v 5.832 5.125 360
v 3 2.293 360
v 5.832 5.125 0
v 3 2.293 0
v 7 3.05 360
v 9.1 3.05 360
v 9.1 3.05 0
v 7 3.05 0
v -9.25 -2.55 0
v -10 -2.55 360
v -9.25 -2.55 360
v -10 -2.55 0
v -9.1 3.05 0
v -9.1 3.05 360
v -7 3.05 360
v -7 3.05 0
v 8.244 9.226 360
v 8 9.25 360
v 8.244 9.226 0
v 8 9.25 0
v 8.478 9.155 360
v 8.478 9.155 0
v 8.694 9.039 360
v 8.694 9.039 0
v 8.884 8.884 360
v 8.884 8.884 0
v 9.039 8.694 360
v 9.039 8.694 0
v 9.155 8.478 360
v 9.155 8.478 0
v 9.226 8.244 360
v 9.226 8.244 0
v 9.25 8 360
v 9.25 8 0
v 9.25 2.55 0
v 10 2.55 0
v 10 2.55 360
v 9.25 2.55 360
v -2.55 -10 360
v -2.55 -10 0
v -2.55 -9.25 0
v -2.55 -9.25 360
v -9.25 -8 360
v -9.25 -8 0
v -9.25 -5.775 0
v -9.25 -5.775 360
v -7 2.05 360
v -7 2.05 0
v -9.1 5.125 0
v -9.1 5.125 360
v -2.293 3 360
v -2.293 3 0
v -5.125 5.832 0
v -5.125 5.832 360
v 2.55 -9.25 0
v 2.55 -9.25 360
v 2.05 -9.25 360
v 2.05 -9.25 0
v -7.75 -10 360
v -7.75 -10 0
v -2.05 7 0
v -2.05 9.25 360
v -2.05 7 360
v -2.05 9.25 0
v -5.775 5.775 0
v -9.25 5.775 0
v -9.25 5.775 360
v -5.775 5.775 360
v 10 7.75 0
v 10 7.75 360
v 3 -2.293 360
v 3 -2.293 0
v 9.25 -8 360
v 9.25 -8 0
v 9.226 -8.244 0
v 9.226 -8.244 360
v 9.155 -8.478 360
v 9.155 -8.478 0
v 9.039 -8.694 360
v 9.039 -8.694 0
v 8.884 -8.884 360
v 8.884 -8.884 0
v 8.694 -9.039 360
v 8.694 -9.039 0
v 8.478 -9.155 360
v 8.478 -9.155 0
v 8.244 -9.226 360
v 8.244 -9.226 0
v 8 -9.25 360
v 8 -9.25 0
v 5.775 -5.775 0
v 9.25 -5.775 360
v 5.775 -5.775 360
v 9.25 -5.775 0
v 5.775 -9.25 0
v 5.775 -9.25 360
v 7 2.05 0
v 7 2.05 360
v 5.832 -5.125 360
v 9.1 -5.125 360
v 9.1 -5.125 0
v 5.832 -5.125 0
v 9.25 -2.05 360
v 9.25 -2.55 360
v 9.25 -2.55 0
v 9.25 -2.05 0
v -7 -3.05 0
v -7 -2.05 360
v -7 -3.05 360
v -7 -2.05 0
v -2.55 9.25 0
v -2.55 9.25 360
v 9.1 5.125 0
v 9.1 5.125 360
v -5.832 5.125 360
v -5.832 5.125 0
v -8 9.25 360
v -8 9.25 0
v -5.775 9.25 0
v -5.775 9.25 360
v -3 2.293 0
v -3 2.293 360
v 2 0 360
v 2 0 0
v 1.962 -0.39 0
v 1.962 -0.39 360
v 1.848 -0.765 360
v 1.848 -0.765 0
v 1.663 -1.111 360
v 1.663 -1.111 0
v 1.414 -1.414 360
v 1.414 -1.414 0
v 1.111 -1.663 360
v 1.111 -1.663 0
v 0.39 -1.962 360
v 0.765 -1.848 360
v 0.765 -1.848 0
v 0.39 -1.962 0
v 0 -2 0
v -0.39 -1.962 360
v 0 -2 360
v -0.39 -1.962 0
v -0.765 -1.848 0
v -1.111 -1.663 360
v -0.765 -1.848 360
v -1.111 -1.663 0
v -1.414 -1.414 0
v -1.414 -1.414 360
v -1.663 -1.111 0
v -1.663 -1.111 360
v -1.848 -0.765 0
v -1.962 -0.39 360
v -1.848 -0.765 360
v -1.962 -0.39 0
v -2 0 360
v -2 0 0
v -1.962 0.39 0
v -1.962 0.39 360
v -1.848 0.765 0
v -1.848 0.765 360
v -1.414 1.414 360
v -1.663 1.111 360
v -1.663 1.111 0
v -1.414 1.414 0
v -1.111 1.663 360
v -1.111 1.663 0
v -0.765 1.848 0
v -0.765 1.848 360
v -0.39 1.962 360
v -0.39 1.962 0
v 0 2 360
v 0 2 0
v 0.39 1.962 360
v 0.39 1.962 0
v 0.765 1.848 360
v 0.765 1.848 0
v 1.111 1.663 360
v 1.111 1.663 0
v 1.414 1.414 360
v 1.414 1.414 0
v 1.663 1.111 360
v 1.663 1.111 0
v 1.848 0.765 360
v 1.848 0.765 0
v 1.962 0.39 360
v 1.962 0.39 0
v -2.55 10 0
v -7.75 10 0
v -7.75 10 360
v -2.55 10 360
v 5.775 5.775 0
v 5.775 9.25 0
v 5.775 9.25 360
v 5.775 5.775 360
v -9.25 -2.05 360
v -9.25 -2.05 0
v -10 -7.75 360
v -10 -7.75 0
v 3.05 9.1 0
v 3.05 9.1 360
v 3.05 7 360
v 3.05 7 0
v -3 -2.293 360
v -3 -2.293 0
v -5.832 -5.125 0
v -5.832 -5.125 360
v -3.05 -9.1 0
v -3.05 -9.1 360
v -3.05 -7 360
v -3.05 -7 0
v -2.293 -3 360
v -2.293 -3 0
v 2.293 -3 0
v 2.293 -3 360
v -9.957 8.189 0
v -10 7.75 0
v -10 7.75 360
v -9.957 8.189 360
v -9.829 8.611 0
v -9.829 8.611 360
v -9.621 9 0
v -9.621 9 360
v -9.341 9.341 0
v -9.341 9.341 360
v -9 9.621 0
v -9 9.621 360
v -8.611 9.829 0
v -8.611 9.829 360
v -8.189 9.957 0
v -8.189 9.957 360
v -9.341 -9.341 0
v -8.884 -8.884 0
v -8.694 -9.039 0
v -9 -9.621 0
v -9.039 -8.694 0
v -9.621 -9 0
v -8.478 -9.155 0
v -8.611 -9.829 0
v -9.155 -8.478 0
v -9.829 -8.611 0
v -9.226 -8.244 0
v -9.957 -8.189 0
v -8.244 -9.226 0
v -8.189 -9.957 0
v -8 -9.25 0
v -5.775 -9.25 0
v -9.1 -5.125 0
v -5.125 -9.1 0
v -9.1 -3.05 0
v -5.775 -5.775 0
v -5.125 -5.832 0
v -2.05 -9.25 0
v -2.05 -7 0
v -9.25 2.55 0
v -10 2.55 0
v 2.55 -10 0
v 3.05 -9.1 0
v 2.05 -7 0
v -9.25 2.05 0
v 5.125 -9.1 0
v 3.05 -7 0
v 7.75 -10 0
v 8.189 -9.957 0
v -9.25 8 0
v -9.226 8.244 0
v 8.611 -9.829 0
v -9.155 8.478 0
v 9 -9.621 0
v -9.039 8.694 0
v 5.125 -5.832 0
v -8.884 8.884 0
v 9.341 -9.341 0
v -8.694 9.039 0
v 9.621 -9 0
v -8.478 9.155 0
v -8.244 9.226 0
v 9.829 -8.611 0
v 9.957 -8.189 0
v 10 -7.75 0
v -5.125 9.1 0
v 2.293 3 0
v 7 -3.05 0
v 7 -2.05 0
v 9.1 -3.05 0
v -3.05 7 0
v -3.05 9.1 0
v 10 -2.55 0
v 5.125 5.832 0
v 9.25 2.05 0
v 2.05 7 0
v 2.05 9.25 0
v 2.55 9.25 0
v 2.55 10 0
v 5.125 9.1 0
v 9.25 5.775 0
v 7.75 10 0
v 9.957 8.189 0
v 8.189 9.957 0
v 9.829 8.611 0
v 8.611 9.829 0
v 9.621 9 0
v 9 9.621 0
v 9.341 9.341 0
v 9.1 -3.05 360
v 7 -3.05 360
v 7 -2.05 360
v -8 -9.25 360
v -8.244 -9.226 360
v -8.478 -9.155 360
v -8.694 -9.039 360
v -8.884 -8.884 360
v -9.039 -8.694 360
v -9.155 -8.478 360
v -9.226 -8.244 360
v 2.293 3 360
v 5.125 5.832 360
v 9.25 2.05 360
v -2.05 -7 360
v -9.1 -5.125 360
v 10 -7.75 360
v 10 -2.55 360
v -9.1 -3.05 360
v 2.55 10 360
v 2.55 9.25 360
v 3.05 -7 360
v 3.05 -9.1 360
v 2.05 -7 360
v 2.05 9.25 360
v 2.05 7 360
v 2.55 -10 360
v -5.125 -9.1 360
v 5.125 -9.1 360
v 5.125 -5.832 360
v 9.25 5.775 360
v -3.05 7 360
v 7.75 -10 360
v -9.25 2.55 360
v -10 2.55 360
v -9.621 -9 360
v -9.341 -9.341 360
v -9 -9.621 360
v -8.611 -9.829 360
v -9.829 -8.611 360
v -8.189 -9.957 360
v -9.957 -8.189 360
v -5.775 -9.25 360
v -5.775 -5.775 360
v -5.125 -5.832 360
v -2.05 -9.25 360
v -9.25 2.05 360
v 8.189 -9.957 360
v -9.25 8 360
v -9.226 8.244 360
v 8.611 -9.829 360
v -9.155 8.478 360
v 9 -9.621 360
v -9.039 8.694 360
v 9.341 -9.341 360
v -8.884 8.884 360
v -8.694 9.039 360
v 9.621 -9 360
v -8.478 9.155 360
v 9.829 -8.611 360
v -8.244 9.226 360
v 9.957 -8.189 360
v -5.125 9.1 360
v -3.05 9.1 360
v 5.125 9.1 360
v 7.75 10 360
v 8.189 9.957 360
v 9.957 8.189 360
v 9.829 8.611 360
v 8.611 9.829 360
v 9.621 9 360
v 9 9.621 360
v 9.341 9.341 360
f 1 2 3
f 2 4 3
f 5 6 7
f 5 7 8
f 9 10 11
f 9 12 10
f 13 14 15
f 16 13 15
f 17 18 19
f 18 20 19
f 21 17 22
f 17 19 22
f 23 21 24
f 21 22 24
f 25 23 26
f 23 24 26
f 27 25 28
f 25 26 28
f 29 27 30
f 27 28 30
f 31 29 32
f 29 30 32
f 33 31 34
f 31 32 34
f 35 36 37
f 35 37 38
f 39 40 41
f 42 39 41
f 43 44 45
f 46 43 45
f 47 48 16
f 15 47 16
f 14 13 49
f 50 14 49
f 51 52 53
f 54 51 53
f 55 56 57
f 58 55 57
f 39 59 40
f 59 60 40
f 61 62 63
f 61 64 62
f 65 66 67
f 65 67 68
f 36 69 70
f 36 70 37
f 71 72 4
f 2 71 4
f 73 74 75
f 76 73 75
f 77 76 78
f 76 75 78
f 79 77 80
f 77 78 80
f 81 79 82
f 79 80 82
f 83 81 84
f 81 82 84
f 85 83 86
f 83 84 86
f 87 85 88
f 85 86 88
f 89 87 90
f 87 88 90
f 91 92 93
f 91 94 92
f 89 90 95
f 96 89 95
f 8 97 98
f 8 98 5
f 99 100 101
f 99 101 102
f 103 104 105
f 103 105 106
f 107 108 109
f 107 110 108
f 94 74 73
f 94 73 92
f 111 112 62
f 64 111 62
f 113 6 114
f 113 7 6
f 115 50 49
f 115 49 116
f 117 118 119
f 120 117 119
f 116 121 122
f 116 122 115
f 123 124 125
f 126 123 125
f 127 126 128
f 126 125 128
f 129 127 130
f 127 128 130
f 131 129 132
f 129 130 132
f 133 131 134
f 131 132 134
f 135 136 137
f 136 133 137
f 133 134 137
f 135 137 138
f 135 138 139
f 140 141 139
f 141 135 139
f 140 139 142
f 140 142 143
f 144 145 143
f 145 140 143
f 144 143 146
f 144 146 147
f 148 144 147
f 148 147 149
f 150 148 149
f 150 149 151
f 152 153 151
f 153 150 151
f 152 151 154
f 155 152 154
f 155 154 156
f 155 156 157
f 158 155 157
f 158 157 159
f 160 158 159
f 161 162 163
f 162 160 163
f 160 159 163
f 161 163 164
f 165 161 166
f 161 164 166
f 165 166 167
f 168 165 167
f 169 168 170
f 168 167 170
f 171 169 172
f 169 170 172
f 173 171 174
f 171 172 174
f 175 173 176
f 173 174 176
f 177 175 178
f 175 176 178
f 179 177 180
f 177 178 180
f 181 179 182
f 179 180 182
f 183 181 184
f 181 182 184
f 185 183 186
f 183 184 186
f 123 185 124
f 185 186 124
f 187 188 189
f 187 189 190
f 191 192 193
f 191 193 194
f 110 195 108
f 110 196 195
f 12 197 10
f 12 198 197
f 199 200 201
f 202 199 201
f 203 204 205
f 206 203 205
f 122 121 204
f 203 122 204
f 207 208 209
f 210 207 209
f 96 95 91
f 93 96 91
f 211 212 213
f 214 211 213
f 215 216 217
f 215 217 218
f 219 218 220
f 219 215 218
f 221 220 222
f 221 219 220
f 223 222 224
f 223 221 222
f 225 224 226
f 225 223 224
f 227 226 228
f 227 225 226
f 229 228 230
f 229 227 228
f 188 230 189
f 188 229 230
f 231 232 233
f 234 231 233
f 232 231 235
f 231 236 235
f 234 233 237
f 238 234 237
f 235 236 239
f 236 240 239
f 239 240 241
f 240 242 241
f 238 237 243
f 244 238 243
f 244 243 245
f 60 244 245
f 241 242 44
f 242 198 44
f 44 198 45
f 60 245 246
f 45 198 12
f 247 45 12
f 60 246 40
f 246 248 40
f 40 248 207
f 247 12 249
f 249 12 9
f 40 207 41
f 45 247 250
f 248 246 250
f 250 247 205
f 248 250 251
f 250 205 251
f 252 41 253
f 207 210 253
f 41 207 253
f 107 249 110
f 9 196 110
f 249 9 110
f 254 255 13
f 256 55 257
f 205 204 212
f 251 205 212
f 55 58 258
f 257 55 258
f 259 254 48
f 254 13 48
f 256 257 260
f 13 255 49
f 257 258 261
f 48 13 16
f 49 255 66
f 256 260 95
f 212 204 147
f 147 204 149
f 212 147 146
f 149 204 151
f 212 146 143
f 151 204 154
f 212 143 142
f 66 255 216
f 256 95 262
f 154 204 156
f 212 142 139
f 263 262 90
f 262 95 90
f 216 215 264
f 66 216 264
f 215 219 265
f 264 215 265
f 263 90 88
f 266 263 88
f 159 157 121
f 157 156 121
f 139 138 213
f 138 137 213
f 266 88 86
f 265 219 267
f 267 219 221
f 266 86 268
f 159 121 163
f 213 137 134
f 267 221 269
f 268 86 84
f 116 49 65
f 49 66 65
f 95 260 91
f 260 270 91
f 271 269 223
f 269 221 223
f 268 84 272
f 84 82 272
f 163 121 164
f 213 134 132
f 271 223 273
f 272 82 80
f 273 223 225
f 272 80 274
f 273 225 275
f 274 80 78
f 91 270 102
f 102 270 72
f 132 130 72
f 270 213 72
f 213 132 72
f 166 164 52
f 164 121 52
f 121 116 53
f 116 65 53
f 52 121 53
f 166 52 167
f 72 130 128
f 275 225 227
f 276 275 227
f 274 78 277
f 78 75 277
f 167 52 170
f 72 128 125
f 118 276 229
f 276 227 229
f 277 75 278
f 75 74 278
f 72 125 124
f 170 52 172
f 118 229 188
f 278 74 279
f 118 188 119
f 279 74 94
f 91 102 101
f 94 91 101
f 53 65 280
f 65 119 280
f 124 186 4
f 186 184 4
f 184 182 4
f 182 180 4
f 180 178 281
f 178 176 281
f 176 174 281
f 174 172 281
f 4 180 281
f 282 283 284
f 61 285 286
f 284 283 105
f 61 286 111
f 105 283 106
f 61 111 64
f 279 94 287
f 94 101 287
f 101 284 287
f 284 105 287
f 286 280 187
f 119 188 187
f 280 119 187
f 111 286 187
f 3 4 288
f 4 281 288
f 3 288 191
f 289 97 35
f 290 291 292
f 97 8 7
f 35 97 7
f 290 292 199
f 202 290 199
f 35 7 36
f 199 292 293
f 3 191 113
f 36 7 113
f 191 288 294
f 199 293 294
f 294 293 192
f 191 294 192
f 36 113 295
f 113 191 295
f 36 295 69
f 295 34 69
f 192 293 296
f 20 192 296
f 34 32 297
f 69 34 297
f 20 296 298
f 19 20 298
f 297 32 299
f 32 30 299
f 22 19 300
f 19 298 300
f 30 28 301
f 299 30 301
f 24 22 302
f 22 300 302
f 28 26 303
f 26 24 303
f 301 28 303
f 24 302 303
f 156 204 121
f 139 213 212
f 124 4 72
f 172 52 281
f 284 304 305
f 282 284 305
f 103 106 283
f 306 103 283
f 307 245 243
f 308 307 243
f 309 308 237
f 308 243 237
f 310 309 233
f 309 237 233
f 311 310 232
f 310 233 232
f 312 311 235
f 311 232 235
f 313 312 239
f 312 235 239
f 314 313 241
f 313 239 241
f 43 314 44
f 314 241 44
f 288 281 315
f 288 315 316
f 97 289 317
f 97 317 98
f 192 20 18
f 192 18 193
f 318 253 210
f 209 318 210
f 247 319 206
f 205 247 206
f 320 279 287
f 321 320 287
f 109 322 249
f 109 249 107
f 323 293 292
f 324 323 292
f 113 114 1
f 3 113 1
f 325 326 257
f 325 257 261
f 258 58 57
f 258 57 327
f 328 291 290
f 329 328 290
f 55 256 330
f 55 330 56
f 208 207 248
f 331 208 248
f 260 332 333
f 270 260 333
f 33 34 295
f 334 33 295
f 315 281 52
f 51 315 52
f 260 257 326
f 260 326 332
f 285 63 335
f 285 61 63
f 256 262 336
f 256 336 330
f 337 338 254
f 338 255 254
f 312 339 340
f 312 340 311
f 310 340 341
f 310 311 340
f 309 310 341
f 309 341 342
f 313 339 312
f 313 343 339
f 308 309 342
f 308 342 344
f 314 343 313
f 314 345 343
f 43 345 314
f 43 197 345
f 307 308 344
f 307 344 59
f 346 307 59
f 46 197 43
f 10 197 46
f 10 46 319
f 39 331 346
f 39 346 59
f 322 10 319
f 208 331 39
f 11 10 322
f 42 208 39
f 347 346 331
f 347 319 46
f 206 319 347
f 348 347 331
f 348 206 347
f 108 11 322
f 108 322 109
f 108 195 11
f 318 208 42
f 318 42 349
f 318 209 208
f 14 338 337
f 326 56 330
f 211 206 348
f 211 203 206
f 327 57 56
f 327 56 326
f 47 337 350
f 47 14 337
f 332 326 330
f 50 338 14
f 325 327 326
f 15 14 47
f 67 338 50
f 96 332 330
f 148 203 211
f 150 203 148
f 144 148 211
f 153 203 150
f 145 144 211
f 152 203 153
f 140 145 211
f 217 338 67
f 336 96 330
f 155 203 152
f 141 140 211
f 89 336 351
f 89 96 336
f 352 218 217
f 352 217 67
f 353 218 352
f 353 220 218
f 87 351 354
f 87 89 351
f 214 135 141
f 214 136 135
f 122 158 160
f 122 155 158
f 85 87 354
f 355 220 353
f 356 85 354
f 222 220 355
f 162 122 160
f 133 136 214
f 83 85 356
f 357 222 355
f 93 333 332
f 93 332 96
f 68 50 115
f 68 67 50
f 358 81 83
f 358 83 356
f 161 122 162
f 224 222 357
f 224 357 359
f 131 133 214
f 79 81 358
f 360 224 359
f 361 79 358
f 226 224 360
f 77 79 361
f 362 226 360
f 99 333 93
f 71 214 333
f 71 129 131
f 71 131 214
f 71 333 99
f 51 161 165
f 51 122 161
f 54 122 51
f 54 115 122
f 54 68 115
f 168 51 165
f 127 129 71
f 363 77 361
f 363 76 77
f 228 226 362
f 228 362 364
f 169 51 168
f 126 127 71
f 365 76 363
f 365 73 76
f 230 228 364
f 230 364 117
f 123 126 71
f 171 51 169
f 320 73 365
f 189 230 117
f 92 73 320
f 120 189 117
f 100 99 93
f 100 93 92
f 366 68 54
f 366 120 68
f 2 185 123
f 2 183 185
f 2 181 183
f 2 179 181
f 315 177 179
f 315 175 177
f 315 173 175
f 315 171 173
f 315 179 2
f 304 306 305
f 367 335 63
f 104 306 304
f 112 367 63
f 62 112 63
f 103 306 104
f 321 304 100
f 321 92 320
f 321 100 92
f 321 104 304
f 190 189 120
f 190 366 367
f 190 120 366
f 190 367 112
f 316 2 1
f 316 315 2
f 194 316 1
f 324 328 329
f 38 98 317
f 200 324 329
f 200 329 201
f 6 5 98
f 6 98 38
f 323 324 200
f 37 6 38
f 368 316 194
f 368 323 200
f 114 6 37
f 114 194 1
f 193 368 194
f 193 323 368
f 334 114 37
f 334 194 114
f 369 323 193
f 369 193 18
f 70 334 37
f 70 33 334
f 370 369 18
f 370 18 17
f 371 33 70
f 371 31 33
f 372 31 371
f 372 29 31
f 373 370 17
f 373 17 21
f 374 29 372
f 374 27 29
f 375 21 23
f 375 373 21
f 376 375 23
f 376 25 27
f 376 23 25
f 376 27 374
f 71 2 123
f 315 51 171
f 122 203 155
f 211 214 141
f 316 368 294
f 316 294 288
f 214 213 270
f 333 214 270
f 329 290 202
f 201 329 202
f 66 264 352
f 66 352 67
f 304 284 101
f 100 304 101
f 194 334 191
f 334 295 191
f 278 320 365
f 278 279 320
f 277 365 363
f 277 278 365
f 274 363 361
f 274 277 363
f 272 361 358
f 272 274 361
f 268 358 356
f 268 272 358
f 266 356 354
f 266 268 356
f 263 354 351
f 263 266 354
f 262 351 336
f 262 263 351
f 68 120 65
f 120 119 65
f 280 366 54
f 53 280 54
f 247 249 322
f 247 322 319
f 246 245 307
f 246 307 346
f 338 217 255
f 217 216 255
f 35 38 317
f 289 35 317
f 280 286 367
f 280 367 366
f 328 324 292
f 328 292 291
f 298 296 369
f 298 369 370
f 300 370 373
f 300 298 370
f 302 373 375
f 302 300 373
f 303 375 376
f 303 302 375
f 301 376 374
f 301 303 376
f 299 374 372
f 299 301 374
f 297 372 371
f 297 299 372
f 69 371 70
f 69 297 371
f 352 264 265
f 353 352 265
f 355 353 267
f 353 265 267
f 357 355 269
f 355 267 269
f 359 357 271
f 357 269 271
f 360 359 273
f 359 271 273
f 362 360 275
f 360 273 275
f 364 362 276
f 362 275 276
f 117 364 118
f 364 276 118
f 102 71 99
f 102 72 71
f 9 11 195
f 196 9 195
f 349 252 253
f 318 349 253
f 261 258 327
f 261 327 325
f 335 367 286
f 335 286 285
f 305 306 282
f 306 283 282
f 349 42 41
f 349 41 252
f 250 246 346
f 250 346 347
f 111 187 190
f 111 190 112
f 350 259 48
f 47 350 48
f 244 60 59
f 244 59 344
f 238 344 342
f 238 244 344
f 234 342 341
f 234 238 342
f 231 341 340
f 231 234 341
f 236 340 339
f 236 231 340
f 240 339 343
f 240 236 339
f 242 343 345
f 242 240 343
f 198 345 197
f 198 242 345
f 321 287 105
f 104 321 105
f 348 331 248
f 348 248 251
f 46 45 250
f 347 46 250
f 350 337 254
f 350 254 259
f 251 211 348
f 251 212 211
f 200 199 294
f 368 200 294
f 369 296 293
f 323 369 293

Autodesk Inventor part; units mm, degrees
ref_plane "YZ Plane" through (0, 0, 0) normal (1, 0, 0) x (0, 1, 0)
ref_plane "XZ Plane" through (0, 0, 0) normal (0, 1, 0) x (-1, 0, 0)
ref_plane "XY Plane" through (0, 0, 0) normal (0, 0, 1) x (1, 0, 0)
sketch "Sketch1" plane through (0, 0, 0) normal (0, 0, 1) x (1, 0, 0)
  line L0 (-2.55, -10) -> (-2.55, -9.25)
  line L1 (-2.55, -9.25) -> (-2.05, -9.25)
  line L2 (-7.75, -10) -> (-2.55, -10)
  line L3 (-2.05, -9.25) -> (-2.05, -7)
  line L4 (-2.05, -7) -> (-3.05, -7)
  line L5 (-3.05, -9.1) -> (-3.05, -7)
  line L6 (-3.05, -9.1) -> (-5.125, -9.1)
  line L7 (-5.125, -9.1) -> (-5.125, -5.8321)
  line L8 (-8, -9.25) -> (-5.775, -9.25)
  line L9 (-5.775, -9.25) -> (-5.775, -5.775)
  line L10 (-2.2929, -3) -> (2.2929, -3)
  line L11 (3, -2.2929) -> (3, 2.2929)
  line L12 (2.2929, 3) -> (-2.2929, 3)
  line L13 (-3, 2.2929) -> (-3, -2.2929)
  line L14 (-2.2929, -3) -> (-5.125, -5.8321)
  line L15 (-3, -2.2929) -> (-5.8321, -5.125)
  line L16 (-9.1, -5.125) -> (-5.8321, -5.125)
  line L17 (-9.25, -5.775) -> (-5.775, -5.775)
  line L18 (-9.25, -8) -> (-9.25, -5.775)
  line L19 (-10, -7.75) -> (-10, -2.55)
  line L20 (-9.1, -3.05) -> (-9.1, -5.125)
  line L21 (-9.1, -3.05) -> (-7, -3.05)
  line L22 (-9.25, -2.55) -> (-9.25, -2.05)
  line L23 (-9.25, -2.05) -> (-7, -2.05)
  line L24 (-7, -2.05) -> (-7, -3.05)
  line L25 (-10, -2.55) -> (-9.25, -2.55)
  arc A0 (-9.25, -8) -> (-8, -9.25) centre (-8, -8) ccw
  arc A1 (-10, -7.75) -> (-7.75, -10) centre (-7.75, -7.75) ccw
  line L26 (3, -2.2929) -> (5.8321, -5.125)
  line L27 (2.2929, -3) -> (5.125, -5.8321)
  line L28 (5.775, -9.25) -> (5.775, -5.775)
  line L29 (8, -9.25) -> (5.775, -9.25)
  line L30 (7.75, -10) -> (2.55, -10)
  line L31 (3.05, -9.1) -> (5.125, -9.1)
  line L32 (2.55, -10) -> (2.55, -9.25)
  line L33 (3.05, -9.1) -> (3.05, -7)
  line L34 (2.05, -9.25) -> (2.05, -7)
  line L35 (2.55, -9.25) -> (2.05, -9.25)
  line L36 (2.05, -7) -> (3.05, -7)
  line L37 (5.125, -9.1) -> (5.125, -5.8321)
  arc A2 (8, -9.25) -> (9.25, -8) centre (8, -8) ccw
  arc A3 (7.75, -10) -> (10, -7.75) centre (7.75, -7.75) ccw
  line L38 (9.25, -8) -> (9.25, -5.775)
  line L39 (10, -7.75) -> (10, -2.55)
  line L40 (9.25, -5.775) -> (5.775, -5.775)
  line L41 (9.1, -5.125) -> (5.8321, -5.125)
  line L42 (9.1, -3.05) -> (7, -3.05)
  line L43 (7, -2.05) -> (7, -3.05)
  line L44 (9.25, -2.05) -> (7, -2.05)
  line L45 (9.25, -2.55) -> (9.25, -2.05)
  line L46 (10, -2.55) -> (9.25, -2.55)
  line L47 (9.1, -3.05) -> (9.1, -5.125)
  line L48 (2.2929, 3) -> (5.125, 5.8321)
  line L49 (3, 2.2929) -> (5.8321, 5.125)
  line L50 (9.25, 5.775) -> (5.775, 5.775)
  line L51 (9.25, 8) -> (9.25, 5.775)
  line L52 (10, 7.75) -> (10, 2.55)
  line L53 (9.1, 3.05) -> (9.1, 5.125)
  line L54 (10, 2.55) -> (9.25, 2.55)
  line L55 (9.1, 3.05) -> (7, 3.05)
  line L56 (9.25, 2.05) -> (7, 2.05)
  line L57 (9.25, 2.55) -> (9.25, 2.05)
  line L58 (7, 2.05) -> (7, 3.05)
  line L59 (9.1, 5.125) -> (5.8321, 5.125)
  arc A4 (9.25, 8) -> (8, 9.25) centre (8, 8) ccw
  arc A5 (10, 7.75) -> (7.75, 10) centre (7.75, 7.75) ccw
  line L60 (8, 9.25) -> (5.775, 9.25)
  line L61 (7.75, 10) -> (2.55, 10)
  line L62 (5.775, 9.25) -> (5.775, 5.775)
  line L63 (5.125, 9.1) -> (5.125, 5.8321)
  line L64 (3.05, 9.1) -> (3.05, 7)
  line L65 (2.05, 7) -> (3.05, 7)
  line L66 (2.05, 9.25) -> (2.05, 7)
  line L67 (2.55, 9.25) -> (2.05, 9.25)
  line L68 (2.55, 10) -> (2.55, 9.25)
  line L69 (3.05, 9.1) -> (5.125, 9.1)
  line L70 (-3, 2.2929) -> (-5.8321, 5.125)
  line L71 (-2.2929, 3) -> (-5.125, 5.8321)
  line L72 (-5.775, 9.25) -> (-5.775, 5.775)
  line L73 (-8, 9.25) -> (-5.775, 9.25)
  line L74 (-7.75, 10) -> (-2.55, 10)
  line L75 (-3.05, 9.1) -> (-5.125, 9.1)
  line L76 (-2.55, 10) -> (-2.55, 9.25)
  line L77 (-3.05, 9.1) -> (-3.05, 7)
  line L78 (-2.05, 9.25) -> (-2.05, 7)
  line L79 (-2.55, 9.25) -> (-2.05, 9.25)
  line L80 (-2.05, 7) -> (-3.05, 7)
  line L81 (-5.125, 9.1) -> (-5.125, 5.8321)
  arc A6 (-8, 9.25) -> (-9.25, 8) centre (-8, 8) ccw
  arc A7 (-7.75, 10) -> (-10, 7.75) centre (-7.75, 7.75) ccw
  line L82 (-9.25, 8) -> (-9.25, 5.775)
  line L83 (-10, 7.75) -> (-10, 2.55)
  line L84 (-9.25, 5.775) -> (-5.775, 5.775)
  line L85 (-9.1, 5.125) -> (-5.8321, 5.125)
  line L86 (-9.1, 3.05) -> (-7, 3.05)
  line L87 (-7, 2.05) -> (-7, 3.05)
  line L88 (-9.25, 2.05) -> (-7, 2.05)
  line L89 (-9.25, 2.55) -> (-9.25, 2.05)
  line L90 (-10, 2.55) -> (-9.25, 2.55)
  line L91 (-9.1, 3.05) -> (-9.1, 5.125)
  circle A8 centre (0, 0) radius 2
  point P0 (-10, -10)
  point P1 (10, -10)
  point P2 (10, 10)
  point P3 (-10, 10)
  dimension "d2" = 0.75
  dimension "d3" = 7.45
  dimension "d4" = 2.25
  dimension "d5" = 1
  dimension "d6" = 2.1
  dimension "d7" = 0.75
  dimension "d8" = 0.65
  dimension "d9" = 1.25
  dimension "d10" = 2.25
  dimension "d11" = 360
  dimension "d12" = 4
  dimension "d13" = 20
extrude "Extrusion1" add sketch "Sketch1" along normal blind 360
properties part number "2020 dai 360"
